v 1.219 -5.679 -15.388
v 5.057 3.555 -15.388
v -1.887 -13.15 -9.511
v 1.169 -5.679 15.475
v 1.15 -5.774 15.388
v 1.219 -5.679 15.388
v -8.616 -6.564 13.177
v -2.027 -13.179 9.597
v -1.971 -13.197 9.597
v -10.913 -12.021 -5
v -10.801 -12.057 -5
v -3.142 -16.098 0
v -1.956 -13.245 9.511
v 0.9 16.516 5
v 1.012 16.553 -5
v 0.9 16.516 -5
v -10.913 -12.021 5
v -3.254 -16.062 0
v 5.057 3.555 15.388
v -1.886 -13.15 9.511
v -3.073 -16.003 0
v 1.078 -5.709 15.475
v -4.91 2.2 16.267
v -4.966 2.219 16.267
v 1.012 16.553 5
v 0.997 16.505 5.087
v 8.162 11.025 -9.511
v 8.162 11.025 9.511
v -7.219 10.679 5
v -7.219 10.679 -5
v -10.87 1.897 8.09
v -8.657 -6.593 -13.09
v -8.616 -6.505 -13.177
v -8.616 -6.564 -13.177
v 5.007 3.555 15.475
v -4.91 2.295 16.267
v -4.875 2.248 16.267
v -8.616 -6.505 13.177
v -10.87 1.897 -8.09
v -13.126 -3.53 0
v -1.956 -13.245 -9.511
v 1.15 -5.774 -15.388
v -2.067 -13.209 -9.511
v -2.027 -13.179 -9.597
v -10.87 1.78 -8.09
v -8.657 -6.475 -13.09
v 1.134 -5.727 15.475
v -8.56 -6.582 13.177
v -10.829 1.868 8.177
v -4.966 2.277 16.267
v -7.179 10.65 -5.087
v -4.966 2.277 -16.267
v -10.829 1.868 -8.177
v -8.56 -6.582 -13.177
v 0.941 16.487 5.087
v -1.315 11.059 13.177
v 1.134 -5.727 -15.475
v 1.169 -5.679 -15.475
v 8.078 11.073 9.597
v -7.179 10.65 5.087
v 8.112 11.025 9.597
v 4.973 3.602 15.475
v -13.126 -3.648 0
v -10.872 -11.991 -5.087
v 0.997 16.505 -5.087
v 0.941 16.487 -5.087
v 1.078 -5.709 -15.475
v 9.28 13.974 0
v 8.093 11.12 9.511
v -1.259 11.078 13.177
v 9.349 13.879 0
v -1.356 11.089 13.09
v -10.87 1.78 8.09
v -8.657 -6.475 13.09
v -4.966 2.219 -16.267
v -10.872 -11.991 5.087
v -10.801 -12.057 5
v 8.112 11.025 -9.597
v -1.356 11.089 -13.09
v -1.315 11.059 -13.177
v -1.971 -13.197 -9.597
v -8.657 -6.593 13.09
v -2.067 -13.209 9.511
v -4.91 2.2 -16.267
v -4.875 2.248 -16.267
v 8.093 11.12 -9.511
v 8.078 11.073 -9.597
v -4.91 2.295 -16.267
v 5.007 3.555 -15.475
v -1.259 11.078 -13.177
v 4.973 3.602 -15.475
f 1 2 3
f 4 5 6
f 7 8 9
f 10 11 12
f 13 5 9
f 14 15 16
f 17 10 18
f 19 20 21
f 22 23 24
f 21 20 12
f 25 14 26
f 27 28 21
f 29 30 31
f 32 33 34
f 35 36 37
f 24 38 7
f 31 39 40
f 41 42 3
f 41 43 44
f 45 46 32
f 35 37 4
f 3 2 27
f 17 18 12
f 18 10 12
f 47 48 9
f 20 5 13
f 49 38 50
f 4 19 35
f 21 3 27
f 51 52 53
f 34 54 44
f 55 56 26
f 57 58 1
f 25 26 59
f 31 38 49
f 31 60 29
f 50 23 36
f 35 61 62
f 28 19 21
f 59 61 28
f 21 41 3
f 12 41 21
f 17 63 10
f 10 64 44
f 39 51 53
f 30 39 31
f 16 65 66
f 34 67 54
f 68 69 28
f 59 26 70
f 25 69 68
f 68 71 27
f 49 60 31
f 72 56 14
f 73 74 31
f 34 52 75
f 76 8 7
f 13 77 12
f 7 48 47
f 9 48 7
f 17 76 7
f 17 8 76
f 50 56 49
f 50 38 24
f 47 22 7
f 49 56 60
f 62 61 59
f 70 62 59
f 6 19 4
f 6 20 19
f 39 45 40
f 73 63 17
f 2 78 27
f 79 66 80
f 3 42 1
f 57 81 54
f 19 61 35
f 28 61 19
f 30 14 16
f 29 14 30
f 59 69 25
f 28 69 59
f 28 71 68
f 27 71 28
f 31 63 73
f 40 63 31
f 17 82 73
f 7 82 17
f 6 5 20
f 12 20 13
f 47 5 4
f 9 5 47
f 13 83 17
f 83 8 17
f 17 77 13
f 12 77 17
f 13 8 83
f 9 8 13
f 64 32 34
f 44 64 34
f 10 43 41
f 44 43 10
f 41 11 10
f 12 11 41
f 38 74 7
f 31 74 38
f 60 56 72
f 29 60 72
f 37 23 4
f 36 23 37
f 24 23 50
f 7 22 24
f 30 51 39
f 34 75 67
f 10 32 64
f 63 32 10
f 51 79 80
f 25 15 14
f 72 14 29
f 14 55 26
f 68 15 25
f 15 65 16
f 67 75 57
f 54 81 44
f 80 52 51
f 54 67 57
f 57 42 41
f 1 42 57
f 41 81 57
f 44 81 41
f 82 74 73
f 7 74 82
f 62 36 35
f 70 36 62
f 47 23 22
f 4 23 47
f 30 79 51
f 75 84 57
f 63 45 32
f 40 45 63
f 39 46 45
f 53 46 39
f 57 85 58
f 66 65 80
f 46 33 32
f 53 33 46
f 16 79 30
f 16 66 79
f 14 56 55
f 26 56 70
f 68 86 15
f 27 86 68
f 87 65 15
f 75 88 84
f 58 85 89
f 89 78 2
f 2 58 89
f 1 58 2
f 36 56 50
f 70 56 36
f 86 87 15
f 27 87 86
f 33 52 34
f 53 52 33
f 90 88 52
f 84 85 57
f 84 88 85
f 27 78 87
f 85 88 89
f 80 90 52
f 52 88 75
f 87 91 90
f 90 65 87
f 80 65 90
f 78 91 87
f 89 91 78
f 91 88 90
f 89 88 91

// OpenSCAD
// Auto-generated OpenSCAD file

    inner_points = 10*[[0.0981256772482181, 1.6457575604228036, -0.49999971188637654], [-1.0832035552174737, -1.1961778079047776, 0.5000005689987711], [-0.1274890829740991, 1.102996499198401, -1.309016652616536], [0.09812663002150081, 1.6457572632118638, 0.5000002881131254], [-1.0832045079907566, -1.1961775106938377, -0.49999943100073085], [-0.8575887949951567, -0.6534167466803746, 1.3090175097289307], [-0.4925404806041831, 0.22479035715641538, -1.618033560192892], [-0.127486588581261, 1.1029957210900594, 1.3090173361320547], [-0.8575912893879948, -0.6534159685720329, -1.3090164790196603], [-0.4925373973650727, 0.224789395361611, 1.6180344173052863], [0.8062478731875907, 1.1025170792040677, -0.951057064318678], [0.9248610728923187, 1.3878632992834963, -5.762265201658678e-07], [-0.317262991238858, -1.6003240717335458, -2.808858743374998e-07], [-0.19864979153413004, -1.314977851654117, 0.9510562072062835], [0.495716297128712, 0.3554704111460145, -1.5388422427756967], [0.8062496854700688, 1.102516513875266, 0.951055968270682], [-0.19865160381660824, -1.3149772863253153, -0.9510568253830763], [0.11188178452474858, -0.5679311835960638, 1.5388413856633023], [0.1118788521901014, -0.5679302688748477, -1.538842151510418], [0.4957192294633592, 0.3554694964247984, 1.5388412943980236], [-0.7138464220032689, 1.0620613123307217, -0.4999991117419643], [-1.3045110382361147, -0.3589063718330689, 1.0287006094733542e-06], [-0.7138454692299859, 1.062061015119782, 0.5000008882575375], [-1.0788962780137976, 0.18385468939133373, 0.8090179694307691], [-1.0788978196333527, 0.183855170288736, -0.8090160193183198]];

    outer_points = 10*[[-1.6409889130468513, -0.11555950142177197, -0.3126779904387301], [1.5886524541888336, -0.11555950142177197, -0.5165225244336256], [-1.348640822211601, 0.8007073739998204, -0.5865166414544996], [-1.3165303884764263, -1.0318263768433644, -0.07777018120554417], [1.2641939296184086, 0.8007073739998204, -0.7514303336668116], [1.2963043633535833, -1.0318263768433644, -0.24268387341785624], [-0.5511531501235996, 1.3669914457760302, -0.7946890769982492], [-0.4991973769465854, -1.5981104486195743, 0.028479987340757858], [0.4468609180885676, 1.3669914457760302, -0.8576805022131136], [0.4988166912655817, -1.5981104486195743, -0.03451143787410652], [-1.5180582313930455, 0.5972695048350894, 0.3778021724529971], [-1.5011767773548241, -0.3661505019915455, 0.6452660147863529], [1.5535132362128419, 0.5972695048350894, 0.1839345000860028], [1.5703946902510633, -0.3661505019915455, 0.4513983424193586], [-0.9450976637241996, 1.376692663078665, 0.12439394786230915], [-0.9009014432726172, -1.1455736602351207, 0.8246233778526778], [0.9532379021306351, 1.376692663078665, 0.004577137019677928], [0.9974341225822174, -1.1455736602351207, 0.7048065670100466], [-0.001146536984352193, 1.674405817908923, -0.018165330220834972], [0.05348299584236998, -1.4432868150653788, 0.8473658450931907], [-0.8699212728256985, -0.0032034345028971734, -0.9394401530094331], [0.744899410792144, -0.0032034345028971734, -1.0413624200068807], [-0.5454627482552734, -0.9194703099244896, -0.704532343776247], [0.4525513199568937, -0.9194703099244896, -0.7675237689911114], [-0.07243360073769692, 0.5630806372733126, -1.1476125885531827]];

    // Convex hull for inner set (I)
    module inner_hull() {
        hull() {
            for (p = inner_points) {
                translate(p) sphere(r=0.1);
            }
        }
    }

    // Convex hull for outer set (O) minus inner hull (O \ I)
    module outer_minus_inner() {
        difference() {
            hull() {
                for (p = outer_points) {
                    translate(p) sphere(r=0.1);
                }
            }
            inner_hull(); // Subtract inner hull
        }
    }

    // Convex hull for outer set (O) minus all translated inner hulls
    module outer_minus_AllTranslationInner() {
        difference() {
            hull() {
                for (p = outer_points) {
                    translate(p) sphere(r=0.1);
                }
            }
            hull() {
                translate([0,0,50]) inner_hull();
                translate([0,0,-50]) inner_hull();
            }; // Subtract translated inner hulls
        }
    }

    // Difference between outer_minus_inner and outer_minus_AllTranslationInner
    module outer_minus_inner_diff() {
        difference() {
            // Outer minus inner
            difference() {
                hull() {
                    for (p = outer_points) {
                        translate(p) sphere(r=0.1);
                    }
                }
                inner_hull();
            }

            // Subtract Outer minus AllTranslationInner
            difference() {
                hull() {
                    for (p = outer_points) {
                        translate(p) sphere(r=0.1);
                    }
                }
                hull() {
                    translate([0,0,50]) inner_hull();
                    translate([0,0,-50]) inner_hull();
                };
            }
        }
    }

    // Rendering all with colors applied
    color([1, 0, 0, 0.5]) inner_hull(); // Transparent red
    
